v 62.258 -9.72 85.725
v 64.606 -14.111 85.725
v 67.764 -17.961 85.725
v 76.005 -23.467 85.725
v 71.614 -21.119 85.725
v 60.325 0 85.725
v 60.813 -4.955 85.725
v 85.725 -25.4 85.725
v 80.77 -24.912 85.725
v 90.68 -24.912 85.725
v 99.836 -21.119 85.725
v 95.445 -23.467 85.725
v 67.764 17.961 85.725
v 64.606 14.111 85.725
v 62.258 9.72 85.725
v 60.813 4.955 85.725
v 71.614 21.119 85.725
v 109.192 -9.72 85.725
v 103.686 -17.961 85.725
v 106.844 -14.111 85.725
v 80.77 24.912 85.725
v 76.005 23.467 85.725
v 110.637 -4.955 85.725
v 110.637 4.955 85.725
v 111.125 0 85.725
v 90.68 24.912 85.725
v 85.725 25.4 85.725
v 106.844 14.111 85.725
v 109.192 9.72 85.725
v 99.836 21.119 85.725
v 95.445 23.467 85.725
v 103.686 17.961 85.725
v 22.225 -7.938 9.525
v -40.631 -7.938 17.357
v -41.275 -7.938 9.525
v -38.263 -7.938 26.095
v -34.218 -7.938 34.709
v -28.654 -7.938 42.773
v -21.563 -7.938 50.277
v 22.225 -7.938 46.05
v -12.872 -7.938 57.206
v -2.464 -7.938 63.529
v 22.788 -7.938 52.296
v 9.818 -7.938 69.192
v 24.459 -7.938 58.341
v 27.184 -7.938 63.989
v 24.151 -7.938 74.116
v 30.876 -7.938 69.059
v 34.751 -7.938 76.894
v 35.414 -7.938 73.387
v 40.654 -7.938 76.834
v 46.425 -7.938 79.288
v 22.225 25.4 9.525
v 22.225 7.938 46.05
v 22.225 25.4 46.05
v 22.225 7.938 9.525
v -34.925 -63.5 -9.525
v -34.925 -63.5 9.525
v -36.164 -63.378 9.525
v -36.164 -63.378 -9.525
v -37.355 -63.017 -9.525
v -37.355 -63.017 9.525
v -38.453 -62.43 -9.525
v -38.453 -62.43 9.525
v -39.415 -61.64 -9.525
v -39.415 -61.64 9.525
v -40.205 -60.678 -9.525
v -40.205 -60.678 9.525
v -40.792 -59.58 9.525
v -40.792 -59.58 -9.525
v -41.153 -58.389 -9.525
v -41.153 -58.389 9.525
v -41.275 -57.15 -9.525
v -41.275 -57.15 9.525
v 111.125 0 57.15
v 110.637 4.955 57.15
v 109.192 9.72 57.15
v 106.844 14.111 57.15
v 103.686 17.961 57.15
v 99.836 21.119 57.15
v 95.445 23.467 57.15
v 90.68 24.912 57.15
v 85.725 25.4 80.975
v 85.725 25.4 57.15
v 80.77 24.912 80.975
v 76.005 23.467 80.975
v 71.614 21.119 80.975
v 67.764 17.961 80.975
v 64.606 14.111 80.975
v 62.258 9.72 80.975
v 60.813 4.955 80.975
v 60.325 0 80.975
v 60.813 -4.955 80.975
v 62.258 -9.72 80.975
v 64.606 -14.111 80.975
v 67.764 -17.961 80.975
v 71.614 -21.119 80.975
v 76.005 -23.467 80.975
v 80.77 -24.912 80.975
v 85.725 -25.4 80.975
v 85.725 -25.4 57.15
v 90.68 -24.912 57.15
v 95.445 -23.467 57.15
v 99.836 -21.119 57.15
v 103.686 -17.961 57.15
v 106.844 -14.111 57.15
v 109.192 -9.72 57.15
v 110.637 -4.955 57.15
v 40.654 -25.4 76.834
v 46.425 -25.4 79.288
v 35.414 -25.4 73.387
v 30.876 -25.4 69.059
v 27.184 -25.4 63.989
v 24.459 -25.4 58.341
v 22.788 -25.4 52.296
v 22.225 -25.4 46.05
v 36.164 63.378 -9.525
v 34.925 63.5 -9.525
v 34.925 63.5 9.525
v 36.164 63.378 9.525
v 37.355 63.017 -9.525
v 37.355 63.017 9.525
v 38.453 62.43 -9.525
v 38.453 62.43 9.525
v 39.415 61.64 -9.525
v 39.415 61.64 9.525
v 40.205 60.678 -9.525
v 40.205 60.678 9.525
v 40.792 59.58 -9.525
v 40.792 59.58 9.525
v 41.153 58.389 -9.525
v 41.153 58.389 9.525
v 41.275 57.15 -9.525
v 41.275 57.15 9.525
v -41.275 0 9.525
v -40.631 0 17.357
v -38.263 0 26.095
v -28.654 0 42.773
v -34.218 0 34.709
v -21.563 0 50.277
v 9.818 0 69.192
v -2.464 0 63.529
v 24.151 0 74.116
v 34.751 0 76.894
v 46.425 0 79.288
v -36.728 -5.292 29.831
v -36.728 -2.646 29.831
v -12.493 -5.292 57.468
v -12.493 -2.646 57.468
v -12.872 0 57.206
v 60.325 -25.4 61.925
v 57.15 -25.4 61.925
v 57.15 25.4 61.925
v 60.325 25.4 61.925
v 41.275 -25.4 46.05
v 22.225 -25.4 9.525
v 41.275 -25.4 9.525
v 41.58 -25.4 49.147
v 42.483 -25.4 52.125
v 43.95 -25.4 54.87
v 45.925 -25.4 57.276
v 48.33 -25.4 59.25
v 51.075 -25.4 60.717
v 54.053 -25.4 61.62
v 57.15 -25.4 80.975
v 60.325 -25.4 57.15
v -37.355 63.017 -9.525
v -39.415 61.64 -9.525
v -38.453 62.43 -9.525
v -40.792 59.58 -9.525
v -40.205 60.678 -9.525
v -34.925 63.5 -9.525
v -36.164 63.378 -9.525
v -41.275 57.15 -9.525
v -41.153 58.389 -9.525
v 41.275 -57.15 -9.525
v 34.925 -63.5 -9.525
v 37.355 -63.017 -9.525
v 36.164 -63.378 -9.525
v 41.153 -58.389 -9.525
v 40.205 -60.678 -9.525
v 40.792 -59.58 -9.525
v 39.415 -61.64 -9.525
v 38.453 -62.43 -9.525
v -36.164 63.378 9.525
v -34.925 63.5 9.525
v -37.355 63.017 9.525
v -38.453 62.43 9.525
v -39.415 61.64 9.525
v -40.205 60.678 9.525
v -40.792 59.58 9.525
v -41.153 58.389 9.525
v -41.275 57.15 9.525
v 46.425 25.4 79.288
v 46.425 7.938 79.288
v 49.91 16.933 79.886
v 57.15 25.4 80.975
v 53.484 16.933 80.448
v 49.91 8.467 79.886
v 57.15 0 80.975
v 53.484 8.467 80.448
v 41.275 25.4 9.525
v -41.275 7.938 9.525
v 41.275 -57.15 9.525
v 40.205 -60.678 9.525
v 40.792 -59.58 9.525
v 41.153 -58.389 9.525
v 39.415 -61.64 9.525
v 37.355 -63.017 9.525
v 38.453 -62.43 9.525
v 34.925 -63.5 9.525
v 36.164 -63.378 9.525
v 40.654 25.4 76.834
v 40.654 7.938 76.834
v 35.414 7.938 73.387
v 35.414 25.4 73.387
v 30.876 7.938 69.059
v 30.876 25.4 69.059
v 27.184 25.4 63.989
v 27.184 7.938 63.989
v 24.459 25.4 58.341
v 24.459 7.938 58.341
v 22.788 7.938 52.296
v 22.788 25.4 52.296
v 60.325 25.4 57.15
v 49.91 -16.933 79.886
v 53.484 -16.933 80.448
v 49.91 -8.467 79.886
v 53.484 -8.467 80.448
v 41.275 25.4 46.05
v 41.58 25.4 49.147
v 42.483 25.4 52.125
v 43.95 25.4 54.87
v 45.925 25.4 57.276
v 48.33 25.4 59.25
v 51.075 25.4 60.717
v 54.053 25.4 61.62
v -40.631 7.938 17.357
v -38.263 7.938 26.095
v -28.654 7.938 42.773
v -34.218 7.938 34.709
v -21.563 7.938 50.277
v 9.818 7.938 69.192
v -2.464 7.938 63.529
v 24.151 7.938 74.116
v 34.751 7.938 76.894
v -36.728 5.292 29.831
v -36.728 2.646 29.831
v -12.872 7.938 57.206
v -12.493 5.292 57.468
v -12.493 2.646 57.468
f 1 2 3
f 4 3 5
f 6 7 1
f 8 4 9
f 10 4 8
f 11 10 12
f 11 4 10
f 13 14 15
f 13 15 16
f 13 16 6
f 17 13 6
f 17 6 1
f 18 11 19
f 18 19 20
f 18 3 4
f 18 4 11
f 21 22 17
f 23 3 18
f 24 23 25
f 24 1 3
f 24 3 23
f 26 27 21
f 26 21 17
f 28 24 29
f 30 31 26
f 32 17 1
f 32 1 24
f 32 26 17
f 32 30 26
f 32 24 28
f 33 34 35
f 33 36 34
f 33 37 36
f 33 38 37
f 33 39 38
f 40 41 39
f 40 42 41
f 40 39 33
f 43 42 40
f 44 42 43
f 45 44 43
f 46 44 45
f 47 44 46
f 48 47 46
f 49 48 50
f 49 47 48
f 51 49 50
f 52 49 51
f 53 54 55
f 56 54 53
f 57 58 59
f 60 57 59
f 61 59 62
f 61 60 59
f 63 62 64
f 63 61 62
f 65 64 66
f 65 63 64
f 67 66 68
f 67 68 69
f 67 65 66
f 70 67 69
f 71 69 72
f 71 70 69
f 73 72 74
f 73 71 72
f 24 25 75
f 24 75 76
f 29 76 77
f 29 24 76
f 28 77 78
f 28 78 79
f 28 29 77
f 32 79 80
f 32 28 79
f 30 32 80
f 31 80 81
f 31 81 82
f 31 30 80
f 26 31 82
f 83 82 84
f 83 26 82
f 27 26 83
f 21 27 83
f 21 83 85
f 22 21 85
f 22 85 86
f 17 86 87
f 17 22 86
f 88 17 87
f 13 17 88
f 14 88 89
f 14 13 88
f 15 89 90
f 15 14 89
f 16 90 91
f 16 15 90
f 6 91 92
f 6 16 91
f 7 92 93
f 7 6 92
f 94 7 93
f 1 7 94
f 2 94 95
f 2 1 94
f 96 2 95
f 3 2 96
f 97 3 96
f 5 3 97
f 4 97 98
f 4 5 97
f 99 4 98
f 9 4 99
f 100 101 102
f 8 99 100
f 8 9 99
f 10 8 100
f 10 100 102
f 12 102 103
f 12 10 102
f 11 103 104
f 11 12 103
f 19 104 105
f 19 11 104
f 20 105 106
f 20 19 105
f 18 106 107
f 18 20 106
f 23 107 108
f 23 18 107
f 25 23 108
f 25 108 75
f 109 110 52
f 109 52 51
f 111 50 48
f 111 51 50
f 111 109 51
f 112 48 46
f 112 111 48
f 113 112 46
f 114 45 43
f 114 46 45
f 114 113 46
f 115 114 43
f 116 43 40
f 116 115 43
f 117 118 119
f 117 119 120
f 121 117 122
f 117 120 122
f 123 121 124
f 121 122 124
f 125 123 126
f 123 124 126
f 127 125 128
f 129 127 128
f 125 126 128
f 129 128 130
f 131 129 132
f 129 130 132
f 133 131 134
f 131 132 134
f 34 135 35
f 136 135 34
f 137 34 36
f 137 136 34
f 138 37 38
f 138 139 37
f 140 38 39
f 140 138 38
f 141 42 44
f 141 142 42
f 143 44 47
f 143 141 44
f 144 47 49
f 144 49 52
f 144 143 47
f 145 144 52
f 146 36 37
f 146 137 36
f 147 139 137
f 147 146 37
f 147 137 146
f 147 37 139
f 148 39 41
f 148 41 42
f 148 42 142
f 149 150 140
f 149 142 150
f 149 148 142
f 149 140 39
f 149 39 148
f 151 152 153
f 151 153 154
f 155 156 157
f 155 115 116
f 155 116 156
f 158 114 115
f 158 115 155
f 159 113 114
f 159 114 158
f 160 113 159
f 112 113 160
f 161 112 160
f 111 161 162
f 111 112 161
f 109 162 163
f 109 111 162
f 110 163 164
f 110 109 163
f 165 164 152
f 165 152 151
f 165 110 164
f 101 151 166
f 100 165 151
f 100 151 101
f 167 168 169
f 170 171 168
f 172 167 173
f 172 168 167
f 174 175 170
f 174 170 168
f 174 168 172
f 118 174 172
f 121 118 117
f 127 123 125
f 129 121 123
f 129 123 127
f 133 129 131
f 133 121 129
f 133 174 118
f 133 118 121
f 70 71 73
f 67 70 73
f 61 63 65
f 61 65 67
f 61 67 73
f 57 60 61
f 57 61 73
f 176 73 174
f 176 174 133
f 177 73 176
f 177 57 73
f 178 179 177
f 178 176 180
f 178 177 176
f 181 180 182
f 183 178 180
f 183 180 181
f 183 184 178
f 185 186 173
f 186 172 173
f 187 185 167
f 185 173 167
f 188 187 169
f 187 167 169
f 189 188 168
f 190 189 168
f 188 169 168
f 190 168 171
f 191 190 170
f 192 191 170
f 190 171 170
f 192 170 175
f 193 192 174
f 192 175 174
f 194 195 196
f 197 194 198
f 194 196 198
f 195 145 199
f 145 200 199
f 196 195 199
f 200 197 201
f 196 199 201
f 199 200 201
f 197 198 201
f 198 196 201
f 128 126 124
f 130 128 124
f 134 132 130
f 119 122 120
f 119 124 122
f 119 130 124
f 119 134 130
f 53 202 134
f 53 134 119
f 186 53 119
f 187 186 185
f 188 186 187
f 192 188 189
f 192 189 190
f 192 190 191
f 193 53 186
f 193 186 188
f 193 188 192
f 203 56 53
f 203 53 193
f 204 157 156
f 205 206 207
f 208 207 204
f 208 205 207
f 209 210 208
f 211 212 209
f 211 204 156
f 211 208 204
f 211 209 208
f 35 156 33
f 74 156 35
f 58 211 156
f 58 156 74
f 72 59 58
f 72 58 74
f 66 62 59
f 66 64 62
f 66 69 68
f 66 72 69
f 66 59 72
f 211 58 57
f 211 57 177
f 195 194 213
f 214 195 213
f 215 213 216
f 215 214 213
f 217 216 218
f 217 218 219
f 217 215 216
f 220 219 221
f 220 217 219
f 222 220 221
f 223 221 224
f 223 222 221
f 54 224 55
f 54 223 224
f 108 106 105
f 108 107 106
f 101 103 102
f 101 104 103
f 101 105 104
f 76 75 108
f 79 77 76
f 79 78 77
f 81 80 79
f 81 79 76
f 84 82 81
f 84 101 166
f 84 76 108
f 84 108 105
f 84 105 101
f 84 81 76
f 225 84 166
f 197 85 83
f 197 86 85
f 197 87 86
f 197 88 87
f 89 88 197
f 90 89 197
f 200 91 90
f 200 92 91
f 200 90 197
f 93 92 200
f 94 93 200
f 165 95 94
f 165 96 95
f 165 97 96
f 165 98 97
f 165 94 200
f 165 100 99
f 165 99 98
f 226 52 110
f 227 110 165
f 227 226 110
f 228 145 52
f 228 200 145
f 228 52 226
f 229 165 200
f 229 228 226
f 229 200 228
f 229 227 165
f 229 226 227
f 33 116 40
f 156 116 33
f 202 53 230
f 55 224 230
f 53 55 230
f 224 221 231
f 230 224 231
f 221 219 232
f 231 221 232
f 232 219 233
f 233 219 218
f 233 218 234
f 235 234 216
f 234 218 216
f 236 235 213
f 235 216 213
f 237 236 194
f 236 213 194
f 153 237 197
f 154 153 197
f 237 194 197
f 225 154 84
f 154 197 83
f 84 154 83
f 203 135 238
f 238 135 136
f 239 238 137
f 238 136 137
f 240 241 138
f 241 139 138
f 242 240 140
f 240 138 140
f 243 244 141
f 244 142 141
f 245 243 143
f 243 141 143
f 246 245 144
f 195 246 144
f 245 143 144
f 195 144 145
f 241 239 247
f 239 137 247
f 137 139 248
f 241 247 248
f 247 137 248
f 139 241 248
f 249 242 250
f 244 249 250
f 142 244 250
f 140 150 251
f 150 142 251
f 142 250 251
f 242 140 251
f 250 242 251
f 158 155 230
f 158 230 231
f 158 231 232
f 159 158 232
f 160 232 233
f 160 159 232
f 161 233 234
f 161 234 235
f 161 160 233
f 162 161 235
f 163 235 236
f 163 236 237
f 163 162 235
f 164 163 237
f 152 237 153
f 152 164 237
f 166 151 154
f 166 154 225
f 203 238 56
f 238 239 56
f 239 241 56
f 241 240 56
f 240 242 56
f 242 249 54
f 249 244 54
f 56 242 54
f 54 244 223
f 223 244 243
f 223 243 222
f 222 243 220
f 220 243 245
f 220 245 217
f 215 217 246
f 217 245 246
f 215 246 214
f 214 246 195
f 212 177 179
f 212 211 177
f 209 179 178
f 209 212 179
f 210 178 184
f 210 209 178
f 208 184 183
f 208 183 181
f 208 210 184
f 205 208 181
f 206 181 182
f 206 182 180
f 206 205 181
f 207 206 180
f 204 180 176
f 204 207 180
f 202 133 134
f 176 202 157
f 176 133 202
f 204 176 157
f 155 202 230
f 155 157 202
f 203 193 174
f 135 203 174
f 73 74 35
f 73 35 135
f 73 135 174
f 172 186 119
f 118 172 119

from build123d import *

# Parameters (mm, degrees)
F1_DEPTH = 63.5
F2_DEPTH = 25.4
F3_DEPTH = 7.9375
F5_R     = 6.35


# Not quite as in the source:
# - a feature names something its author has since deleted; it is built from what else it names


with BuildPart() as f1:
    # F0 (on Front) → F1 (new body, symmetric)
    with BuildSketch(Plane.XZ):
        Polygon((41.275, -9.525), (41.275, 9.525), (22.225, 9.525), (-41.275, 9.525), (-41.275, -9.525), align=None)
    extrude(amount=F1_DEPTH, both=True)

    # F0 (on Front) → F2 (join, symmetric)
    with BuildSketch(Plane.XZ):
        with BuildLine():
            Line((22.225, 9.525), (41.275, 9.525))
            Line((41.275, 9.525), (41.275, 46.0502))
            ThreePointArc((41.275, 46.0502), (45.9246798487, 57.2755201513), (57.15, 61.9252))
            Line((57.15, 61.9252), (60.325, 61.9252))
            Line((60.325, 61.9252), (60.325, 80.9752))
            Line((60.325, 80.9752), (57.15, 80.9752))
            add(Edge.make_bspline(
                [(46.42519144, 79.2877406183), (49.8648948299, 79.9027002695), (53.4381248944, 80.4666827005), (57.15, 80.9752)],
                knots=[116.6855453381, 116.6855453381, 116.6855453381, 116.6855453381, 121.6248811101, 121.6248811101, 121.6248811101, 121.6248811101], degree=3))
            ThreePointArc((46.42519144, 79.2877406183), (28.9159818308, 66.6073360608), (22.225, 46.0502))
            Line((22.225, 46.0502), (22.225, 9.525))
        make_face()
        Polygon((60.325, 80.9752), (60.325, 61.9252), (60.325, 57.15), (85.725, 57.15), (85.725, 80.9752), align=None)
    extrude(amount=F2_DEPTH, both=True)

    # F0 (on Front) → F3 (join, symmetric)
    with BuildSketch(Plane.XZ):
        with BuildLine():
            Line((-41.275, 9.525), (22.225, 9.525))
            Line((22.225, 9.525), (22.225, 46.0502))
            ThreePointArc((22.225, 46.0502), (28.9159818308, 66.6073360608), (46.42519144, 79.2877406183))
            add(Edge.make_bspline(
                [(-41.275, 9.525), (-41.5734088799, 21.7830526255), (-34.833440161, 64.760098527), (46.42519144, 79.2877406183)],
                knots=[0, 0, 0, 0, 116.6855453381, 116.6855453381, 116.6855453381, 116.6855453381], degree=3))
        make_face()
    extrude(amount=F3_DEPTH, both=True)

    # F0 (on Front) → F4 (revolve)
    with BuildSketch(Plane.XZ):
        Polygon((85.725, 80.9752), (85.725, 57.15), (111.125, 57.15), (111.125, 85.725), (85.725, 85.725), align=None)
    revolve(axis=Axis((85.725, 0, 71.4375), (0, 0, 1)))

    # F5
    f5_edges = [f1.edges().sort_by_distance(p)[0] for p in [
        (41.275, -63.5, 0),
        (-41.275, -63.5, 0),
        (-41.275, 63.5, 0),
        (41.275, 63.5, 0),
    ]]
    fillet(f5_edges, radius=F5_R)


solid = f1.part
